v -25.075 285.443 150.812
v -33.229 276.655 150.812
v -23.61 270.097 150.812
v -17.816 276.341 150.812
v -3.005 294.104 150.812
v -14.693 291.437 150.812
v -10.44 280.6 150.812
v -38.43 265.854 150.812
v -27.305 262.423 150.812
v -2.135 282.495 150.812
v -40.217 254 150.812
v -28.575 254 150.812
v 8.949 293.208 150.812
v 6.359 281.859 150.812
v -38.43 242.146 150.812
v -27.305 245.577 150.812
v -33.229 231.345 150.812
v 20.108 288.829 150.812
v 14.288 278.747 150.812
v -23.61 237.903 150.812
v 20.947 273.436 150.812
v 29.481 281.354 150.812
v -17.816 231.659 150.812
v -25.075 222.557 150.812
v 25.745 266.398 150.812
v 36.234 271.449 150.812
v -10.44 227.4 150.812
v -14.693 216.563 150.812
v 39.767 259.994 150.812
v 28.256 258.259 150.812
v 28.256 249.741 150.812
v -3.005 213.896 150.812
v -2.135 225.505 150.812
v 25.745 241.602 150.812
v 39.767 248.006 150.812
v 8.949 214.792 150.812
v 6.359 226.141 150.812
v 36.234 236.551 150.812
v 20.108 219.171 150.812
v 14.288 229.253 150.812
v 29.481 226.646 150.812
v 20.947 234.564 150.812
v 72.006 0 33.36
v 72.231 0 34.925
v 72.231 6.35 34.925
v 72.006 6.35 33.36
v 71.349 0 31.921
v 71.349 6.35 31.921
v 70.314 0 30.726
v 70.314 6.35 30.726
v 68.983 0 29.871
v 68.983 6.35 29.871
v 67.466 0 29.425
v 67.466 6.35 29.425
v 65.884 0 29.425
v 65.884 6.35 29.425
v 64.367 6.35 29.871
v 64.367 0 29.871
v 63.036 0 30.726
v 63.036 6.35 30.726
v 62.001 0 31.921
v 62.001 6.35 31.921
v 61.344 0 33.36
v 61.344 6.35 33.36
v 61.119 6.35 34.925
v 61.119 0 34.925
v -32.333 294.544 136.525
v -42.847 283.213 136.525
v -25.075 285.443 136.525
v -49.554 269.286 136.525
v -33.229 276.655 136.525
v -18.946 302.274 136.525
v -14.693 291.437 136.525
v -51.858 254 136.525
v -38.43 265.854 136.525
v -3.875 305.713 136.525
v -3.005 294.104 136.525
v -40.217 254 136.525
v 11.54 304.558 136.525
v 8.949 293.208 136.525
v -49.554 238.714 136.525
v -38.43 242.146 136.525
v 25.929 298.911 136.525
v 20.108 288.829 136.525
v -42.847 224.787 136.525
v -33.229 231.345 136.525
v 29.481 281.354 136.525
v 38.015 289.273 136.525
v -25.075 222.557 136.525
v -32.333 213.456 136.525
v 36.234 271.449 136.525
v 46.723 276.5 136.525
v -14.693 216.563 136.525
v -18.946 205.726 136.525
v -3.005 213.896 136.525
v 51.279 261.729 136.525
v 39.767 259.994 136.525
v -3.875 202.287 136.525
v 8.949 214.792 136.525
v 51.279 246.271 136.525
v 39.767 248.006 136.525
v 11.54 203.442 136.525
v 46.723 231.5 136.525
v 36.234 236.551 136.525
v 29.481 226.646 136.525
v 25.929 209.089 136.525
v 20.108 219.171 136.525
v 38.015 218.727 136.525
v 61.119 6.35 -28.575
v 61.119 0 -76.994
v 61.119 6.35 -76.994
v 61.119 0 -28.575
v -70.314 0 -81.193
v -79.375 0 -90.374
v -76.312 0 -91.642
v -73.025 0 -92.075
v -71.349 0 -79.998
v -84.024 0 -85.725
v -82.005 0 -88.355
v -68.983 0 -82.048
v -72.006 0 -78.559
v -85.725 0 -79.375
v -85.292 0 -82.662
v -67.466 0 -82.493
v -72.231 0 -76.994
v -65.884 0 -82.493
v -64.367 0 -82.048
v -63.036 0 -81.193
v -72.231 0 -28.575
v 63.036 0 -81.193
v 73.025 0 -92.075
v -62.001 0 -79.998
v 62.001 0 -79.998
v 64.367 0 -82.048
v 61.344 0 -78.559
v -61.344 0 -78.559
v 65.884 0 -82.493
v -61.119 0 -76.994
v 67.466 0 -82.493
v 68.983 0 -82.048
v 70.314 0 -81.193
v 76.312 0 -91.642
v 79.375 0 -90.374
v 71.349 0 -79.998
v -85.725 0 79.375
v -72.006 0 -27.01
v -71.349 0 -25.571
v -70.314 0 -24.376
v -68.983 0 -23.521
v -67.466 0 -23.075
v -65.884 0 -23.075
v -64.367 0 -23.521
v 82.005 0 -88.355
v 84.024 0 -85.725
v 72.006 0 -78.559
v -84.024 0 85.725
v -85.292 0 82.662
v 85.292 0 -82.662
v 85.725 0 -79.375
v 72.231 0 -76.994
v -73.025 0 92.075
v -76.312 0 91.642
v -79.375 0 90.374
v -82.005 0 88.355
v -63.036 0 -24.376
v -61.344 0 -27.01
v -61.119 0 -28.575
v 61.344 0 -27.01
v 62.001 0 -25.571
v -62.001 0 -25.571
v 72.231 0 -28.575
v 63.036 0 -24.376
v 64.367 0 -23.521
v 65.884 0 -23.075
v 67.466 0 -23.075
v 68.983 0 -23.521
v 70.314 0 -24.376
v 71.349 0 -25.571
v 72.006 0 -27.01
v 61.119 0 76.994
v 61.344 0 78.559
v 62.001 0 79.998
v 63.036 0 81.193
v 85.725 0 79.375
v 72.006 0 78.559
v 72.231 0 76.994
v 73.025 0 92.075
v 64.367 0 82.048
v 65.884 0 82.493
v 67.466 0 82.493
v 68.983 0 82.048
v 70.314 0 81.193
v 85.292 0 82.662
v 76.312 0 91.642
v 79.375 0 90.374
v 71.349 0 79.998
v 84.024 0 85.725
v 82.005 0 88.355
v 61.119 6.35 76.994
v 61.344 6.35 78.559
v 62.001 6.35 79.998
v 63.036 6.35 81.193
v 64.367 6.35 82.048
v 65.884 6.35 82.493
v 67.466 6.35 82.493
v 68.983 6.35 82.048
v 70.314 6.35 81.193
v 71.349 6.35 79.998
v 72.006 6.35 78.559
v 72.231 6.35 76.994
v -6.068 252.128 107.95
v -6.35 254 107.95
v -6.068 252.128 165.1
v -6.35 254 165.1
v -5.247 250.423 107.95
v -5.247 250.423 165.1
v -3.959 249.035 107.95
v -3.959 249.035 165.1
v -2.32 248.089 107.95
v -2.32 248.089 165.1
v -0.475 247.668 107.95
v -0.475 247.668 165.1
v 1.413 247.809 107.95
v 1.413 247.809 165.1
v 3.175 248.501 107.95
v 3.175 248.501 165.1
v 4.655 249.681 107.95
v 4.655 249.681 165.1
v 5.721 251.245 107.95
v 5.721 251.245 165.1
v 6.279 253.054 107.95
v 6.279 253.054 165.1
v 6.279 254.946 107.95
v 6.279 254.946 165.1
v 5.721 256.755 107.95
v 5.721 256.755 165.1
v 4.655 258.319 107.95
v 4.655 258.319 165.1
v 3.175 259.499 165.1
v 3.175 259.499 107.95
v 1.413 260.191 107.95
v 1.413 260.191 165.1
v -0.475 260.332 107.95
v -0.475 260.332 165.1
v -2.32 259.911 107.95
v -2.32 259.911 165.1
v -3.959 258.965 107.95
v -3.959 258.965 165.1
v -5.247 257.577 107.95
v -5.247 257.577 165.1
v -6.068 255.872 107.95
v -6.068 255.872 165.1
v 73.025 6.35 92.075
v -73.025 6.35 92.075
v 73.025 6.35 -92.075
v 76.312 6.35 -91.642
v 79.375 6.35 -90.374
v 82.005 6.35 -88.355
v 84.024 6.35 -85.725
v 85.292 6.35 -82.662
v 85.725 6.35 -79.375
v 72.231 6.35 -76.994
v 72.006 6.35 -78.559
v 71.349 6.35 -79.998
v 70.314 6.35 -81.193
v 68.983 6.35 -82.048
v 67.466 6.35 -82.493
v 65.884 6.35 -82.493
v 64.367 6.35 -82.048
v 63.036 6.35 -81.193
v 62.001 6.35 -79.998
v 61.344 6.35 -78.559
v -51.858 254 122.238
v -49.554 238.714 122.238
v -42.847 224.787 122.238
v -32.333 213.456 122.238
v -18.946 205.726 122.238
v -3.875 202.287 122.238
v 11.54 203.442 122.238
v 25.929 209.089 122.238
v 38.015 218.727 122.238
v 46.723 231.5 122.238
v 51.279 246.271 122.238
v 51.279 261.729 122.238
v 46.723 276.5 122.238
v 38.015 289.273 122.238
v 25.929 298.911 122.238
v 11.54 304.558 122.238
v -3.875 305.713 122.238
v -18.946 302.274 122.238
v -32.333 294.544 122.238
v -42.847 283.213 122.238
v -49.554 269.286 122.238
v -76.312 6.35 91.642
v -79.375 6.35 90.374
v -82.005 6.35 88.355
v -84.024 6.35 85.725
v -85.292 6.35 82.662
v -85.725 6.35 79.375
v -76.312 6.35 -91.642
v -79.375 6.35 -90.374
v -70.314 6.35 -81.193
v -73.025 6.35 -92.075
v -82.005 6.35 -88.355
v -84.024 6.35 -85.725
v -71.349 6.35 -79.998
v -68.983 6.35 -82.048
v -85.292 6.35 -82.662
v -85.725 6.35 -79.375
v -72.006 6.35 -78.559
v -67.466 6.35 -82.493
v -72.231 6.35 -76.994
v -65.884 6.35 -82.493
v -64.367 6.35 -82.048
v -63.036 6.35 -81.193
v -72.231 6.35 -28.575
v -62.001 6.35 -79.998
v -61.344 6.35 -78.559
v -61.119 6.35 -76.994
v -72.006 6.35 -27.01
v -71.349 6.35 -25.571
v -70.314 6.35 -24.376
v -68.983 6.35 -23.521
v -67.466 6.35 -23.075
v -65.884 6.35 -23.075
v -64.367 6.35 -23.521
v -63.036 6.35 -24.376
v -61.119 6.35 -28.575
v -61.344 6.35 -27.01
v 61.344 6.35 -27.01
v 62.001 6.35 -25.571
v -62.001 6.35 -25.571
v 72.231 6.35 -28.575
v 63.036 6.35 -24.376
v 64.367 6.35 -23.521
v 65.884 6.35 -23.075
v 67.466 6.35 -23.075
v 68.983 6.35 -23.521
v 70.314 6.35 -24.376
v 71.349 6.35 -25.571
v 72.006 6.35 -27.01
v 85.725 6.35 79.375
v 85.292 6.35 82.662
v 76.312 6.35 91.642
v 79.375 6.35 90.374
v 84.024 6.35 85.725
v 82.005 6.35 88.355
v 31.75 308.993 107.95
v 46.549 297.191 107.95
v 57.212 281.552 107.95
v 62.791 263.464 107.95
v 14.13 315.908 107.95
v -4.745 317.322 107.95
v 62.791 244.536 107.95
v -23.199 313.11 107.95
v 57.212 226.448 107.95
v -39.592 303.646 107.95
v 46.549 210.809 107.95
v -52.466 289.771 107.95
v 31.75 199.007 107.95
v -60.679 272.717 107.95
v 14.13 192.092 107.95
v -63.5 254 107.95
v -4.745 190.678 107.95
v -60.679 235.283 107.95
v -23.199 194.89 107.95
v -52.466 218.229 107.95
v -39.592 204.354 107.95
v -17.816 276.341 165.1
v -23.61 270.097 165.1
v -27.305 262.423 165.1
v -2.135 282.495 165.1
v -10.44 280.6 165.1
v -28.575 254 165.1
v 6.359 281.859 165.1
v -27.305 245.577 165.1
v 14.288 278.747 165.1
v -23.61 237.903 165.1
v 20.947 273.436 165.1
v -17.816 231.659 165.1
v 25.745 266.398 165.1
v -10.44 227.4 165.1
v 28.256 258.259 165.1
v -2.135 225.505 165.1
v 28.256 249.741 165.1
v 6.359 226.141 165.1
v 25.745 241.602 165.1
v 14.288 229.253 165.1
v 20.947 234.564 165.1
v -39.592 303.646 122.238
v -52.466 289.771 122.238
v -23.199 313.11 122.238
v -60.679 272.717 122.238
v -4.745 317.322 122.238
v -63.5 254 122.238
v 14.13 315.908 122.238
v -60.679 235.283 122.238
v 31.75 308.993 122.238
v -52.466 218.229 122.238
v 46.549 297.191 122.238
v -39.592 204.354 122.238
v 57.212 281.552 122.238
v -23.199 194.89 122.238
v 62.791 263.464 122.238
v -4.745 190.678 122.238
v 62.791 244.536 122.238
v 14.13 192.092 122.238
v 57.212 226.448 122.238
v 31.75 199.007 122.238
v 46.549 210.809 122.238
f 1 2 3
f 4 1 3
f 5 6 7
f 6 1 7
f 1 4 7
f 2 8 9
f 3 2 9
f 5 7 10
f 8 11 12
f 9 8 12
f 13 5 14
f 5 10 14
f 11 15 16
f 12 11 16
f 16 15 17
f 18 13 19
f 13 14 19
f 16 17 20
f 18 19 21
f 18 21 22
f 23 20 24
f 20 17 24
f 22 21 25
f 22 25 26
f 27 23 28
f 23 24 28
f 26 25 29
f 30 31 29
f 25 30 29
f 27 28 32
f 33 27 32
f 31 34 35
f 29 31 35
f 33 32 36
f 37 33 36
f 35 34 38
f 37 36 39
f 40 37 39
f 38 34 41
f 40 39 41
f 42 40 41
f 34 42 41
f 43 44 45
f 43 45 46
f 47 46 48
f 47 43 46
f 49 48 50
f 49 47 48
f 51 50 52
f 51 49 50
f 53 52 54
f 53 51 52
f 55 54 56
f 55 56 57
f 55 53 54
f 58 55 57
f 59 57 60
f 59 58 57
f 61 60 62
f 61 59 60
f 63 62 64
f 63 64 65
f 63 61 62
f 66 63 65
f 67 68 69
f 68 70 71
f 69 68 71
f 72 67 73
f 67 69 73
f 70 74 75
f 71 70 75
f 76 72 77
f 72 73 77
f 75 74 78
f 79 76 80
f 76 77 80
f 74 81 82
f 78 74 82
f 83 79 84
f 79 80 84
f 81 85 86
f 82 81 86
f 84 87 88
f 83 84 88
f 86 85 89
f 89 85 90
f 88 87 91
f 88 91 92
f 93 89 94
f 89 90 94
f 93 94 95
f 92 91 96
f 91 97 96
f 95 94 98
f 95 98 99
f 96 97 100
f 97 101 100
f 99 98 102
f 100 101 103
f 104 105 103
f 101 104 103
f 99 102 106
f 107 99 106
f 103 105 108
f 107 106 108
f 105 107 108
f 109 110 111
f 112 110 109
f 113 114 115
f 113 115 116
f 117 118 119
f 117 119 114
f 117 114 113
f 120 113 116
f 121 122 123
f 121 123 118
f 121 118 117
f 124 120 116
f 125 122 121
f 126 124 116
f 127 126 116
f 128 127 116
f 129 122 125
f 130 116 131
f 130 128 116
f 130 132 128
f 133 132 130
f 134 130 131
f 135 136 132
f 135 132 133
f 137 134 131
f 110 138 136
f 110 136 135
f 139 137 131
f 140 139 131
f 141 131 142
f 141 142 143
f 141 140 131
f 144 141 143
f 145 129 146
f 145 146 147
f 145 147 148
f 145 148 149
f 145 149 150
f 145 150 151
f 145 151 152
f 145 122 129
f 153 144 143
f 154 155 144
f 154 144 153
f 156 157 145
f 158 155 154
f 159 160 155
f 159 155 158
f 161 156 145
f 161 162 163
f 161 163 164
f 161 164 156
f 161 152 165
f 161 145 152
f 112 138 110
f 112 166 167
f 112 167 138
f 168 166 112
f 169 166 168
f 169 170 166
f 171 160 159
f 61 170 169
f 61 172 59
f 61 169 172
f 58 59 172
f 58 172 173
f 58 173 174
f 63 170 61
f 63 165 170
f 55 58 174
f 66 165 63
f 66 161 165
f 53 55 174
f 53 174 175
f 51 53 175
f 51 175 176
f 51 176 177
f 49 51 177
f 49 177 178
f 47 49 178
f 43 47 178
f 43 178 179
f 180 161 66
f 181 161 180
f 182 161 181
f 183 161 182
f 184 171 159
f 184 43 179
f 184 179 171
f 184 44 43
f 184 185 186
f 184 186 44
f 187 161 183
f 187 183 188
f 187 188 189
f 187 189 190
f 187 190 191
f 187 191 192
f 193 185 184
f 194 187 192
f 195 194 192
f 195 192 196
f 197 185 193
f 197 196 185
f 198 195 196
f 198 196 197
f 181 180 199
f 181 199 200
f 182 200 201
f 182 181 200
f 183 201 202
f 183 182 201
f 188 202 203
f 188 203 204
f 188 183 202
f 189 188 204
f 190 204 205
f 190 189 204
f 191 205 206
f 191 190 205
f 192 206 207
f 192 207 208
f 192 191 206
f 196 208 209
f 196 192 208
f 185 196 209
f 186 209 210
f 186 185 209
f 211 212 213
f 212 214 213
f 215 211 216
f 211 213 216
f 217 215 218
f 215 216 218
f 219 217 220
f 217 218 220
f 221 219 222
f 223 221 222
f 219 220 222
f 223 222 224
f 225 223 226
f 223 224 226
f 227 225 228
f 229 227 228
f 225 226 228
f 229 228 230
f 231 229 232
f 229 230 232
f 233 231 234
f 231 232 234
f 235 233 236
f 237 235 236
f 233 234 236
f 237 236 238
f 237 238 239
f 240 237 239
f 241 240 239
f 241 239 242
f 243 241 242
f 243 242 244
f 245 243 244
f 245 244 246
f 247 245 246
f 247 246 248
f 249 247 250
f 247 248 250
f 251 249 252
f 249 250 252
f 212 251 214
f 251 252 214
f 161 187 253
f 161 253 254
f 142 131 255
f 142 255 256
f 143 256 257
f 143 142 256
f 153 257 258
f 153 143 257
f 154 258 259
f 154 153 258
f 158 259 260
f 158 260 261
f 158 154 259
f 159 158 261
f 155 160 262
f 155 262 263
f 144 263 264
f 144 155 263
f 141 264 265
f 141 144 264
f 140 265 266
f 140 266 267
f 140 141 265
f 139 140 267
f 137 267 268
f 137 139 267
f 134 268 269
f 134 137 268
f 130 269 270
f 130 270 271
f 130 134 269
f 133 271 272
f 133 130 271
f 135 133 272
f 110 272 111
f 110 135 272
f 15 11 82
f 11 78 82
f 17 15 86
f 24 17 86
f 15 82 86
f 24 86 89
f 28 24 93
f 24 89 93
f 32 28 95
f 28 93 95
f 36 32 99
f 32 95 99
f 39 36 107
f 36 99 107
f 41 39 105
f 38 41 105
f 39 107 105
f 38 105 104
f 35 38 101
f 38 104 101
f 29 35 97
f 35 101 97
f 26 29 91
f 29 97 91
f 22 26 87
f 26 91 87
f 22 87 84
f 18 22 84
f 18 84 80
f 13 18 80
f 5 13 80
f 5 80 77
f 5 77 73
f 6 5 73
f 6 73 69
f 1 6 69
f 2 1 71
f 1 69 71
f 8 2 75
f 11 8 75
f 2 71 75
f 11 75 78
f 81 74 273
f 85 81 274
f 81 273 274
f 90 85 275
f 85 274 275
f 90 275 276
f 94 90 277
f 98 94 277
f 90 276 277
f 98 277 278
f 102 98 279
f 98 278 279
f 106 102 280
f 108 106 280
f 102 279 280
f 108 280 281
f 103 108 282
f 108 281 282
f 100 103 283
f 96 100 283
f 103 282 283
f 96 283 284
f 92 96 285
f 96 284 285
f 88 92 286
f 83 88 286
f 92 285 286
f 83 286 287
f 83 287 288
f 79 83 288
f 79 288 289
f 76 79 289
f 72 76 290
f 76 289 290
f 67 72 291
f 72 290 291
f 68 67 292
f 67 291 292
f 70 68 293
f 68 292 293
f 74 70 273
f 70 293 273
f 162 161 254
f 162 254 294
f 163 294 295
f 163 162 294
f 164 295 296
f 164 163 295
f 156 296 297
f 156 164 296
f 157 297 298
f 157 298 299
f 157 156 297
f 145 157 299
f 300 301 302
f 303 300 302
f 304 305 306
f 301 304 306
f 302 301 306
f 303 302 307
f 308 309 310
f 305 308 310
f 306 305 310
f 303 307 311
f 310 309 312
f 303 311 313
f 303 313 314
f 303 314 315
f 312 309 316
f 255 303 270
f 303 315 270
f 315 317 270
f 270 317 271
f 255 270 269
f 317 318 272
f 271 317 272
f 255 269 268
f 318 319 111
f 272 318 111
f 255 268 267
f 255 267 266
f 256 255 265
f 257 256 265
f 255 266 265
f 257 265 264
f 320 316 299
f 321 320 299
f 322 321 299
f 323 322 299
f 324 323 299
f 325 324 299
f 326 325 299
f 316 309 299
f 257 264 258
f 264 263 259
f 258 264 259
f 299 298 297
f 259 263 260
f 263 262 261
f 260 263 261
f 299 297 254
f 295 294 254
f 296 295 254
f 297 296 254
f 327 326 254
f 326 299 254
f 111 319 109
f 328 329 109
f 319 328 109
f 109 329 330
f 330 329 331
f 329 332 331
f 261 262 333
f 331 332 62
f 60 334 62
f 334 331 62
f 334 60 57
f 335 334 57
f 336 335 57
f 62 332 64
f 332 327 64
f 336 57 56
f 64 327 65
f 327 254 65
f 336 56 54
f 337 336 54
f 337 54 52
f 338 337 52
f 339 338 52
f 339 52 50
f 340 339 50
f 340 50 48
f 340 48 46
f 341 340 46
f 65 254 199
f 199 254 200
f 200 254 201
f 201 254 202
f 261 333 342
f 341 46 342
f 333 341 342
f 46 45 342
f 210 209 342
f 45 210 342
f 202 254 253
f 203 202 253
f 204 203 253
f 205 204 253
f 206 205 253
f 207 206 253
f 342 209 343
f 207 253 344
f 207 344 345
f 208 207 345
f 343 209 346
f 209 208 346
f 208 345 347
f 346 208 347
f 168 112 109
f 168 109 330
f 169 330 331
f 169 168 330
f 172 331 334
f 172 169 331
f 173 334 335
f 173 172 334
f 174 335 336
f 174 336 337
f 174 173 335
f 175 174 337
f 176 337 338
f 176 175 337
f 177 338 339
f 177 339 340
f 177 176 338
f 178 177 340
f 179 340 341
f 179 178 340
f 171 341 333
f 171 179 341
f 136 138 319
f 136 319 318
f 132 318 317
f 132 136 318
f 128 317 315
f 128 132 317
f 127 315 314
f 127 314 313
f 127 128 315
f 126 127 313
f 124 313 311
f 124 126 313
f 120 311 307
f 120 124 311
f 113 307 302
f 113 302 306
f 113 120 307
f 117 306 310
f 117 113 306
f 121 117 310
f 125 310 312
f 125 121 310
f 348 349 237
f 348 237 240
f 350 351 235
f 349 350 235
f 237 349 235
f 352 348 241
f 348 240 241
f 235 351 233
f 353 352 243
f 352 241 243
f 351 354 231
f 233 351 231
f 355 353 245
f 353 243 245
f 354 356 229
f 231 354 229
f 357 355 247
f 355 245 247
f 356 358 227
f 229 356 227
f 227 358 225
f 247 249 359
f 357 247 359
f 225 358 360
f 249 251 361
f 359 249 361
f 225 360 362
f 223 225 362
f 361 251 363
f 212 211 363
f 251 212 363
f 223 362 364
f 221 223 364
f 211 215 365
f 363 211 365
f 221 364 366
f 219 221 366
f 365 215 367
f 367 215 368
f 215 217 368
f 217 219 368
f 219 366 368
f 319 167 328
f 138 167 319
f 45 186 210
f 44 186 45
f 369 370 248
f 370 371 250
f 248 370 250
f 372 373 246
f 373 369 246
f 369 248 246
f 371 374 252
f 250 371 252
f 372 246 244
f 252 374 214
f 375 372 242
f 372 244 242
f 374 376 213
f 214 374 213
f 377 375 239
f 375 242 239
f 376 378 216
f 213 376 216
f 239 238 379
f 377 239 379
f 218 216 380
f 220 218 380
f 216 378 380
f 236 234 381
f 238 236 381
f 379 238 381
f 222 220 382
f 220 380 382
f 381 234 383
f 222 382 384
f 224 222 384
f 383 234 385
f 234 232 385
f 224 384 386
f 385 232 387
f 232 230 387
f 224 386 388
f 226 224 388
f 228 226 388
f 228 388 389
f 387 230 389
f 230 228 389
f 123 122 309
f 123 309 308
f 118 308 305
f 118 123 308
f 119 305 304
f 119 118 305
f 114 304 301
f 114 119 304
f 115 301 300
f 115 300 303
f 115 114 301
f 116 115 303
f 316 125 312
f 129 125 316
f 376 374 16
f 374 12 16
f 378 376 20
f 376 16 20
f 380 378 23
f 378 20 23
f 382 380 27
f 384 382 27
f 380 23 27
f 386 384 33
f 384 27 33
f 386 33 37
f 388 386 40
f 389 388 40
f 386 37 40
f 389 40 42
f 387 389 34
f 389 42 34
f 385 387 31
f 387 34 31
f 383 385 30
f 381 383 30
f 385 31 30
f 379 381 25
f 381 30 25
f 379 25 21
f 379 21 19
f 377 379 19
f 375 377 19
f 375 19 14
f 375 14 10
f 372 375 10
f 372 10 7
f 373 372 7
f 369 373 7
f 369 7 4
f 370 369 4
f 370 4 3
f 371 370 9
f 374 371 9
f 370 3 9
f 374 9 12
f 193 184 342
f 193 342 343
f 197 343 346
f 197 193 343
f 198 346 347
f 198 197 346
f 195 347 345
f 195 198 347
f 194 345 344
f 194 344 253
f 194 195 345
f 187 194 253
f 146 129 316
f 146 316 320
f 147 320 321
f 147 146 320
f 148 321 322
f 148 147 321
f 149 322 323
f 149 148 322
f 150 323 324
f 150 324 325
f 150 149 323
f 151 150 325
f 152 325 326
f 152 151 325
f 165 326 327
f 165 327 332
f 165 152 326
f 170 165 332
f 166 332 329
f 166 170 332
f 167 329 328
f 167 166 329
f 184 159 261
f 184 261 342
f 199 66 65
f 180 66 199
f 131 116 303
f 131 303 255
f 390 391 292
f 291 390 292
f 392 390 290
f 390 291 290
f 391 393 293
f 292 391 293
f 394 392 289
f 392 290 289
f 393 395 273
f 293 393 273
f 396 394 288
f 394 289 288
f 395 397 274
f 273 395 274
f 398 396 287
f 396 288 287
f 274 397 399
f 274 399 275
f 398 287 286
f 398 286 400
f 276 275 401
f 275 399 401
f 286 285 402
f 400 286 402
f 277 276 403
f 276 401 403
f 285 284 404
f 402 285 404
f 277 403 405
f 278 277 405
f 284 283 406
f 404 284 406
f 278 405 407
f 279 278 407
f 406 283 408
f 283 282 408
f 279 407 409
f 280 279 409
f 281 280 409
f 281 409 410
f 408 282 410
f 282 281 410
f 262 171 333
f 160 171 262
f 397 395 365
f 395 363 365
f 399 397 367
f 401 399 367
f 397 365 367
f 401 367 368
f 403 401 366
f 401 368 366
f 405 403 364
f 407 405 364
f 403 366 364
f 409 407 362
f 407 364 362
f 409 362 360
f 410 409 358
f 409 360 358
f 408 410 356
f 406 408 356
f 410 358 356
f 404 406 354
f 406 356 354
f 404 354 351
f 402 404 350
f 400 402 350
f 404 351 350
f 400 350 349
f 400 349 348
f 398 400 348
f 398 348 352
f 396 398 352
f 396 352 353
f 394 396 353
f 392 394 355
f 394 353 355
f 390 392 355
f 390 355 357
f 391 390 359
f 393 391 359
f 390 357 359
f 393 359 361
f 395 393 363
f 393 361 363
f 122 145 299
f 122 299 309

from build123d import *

# Parameters (mm, degrees)
F2_DEPTH = 6.35


with BuildPart() as f2:
    # F1 (on Front) → F2 (new body)
    with BuildSketch(Plane.XZ):
        with BuildLine():
            ThreePointArc((72.23125, 76.99375), (66.675, 82.55), (61.11875, 76.99375))
            Line((61.11875, 76.99375), (61.11875, 34.925))
            ThreePointArc((61.11875, 34.925), (66.675, 29.36875), (72.23125, 34.925))
            Line((72.23125, 34.925), (72.23125, 76.99375))
        make_face()
        with BuildLine():
            ThreePointArc((72.23125, -28.575), (66.675, -23.01875), (61.11875, -28.575))
            Line((61.11875, -28.575), (61.11875, -76.99375))
            ThreePointArc((61.11875, -76.99375), (66.675, -82.55), (72.23125, -76.99375))
            Line((72.23125, -76.99375), (72.23125, -28.575))
        make_face()
        with BuildLine():
            ThreePointArc((-72.23125, -76.99375), (-66.675, -82.55), (-61.11875, -76.99375))
            Line((-61.11875, -76.99375), (-61.11875, -28.575))
            ThreePointArc((-61.11875, -28.575), (-66.675, -23.01875), (-72.23125, -28.575))
            Line((-72.23125, -28.575), (-72.23125, -76.99375))
        make_face()
        with BuildLine():
            ThreePointArc((85.725, 79.375), (82.005256, 88.355256), (73.025, 92.075))
            Line((73.025, 92.075), (-73.025, 92.075))
            ThreePointArc((-73.025, 92.075), (-82.005256, 88.355256), (-85.725, 79.375))
            Line((-85.725, 79.375), (-85.725, -79.375))
            ThreePointArc((-85.725, -79.375), (-82.005256, -88.355256), (-73.025, -92.075))
            Line((-73.025, -92.075), (73.025, -92.075))
            ThreePointArc((73.025, -92.075), (82.005256, -88.355256), (85.725, -79.375))
            Line((85.725, -79.375), (85.725, 79.375))
        make_face()
        with BuildLine():
            Line((-61.11875, -28.575), (-61.11875, -76.99375))
            ThreePointArc((-61.11875, -76.99375), (-66.675, -82.55), (-72.23125, -76.99375))
            Line((-72.23125, -76.99375), (-72.23125, -28.575))
            ThreePointArc((-72.23125, -28.575), (-66.675, -23.01875), (-61.11875, -28.575))
        make_face(mode=Mode.SUBTRACT)
        with BuildLine():
            Line((61.11875, -76.99375), (61.11875, -28.575))
            ThreePointArc((61.11875, -28.575), (66.675, -23.01875), (72.23125, -28.575))
            Line((72.23125, -28.575), (72.23125, -76.99375))
            ThreePointArc((72.23125, -76.99375), (66.675, -82.55), (61.11875, -76.99375))
        make_face(mode=Mode.SUBTRACT)
        with BuildLine():
            Line((61.11875, 34.925), (61.11875, 76.99375))
            ThreePointArc((61.11875, 76.99375), (66.675, 82.55), (72.23125, 76.99375))
            Line((72.23125, 76.99375), (72.23125, 34.925))
            ThreePointArc((72.23125, 34.925), (66.675, 29.36875), (61.11875, 34.925))
        make_face(mode=Mode.SUBTRACT)
    extrude(amount=-F2_DEPTH)


with BuildPart() as f4:
    # F3 (on offset) → F4 (revolve)
    with BuildSketch(Plane.XZ.offset(-254)):
        Polygon((-63.5, 107.95), (-6.35, 107.95), (-6.35, 165.1), (-28.575, 165.1), (-28.575, 150.8125), (-40.216667, 150.8125), (-40.216667, 136.525), (-51.858333, 136.525), (-51.858333, 122.2375), (-63.5, 122.2375), align=None)
    revolve(axis=Axis((0, 254, 72.207878), (0, 0, 1)))


solid = Compound([f2.part, f4.part])
